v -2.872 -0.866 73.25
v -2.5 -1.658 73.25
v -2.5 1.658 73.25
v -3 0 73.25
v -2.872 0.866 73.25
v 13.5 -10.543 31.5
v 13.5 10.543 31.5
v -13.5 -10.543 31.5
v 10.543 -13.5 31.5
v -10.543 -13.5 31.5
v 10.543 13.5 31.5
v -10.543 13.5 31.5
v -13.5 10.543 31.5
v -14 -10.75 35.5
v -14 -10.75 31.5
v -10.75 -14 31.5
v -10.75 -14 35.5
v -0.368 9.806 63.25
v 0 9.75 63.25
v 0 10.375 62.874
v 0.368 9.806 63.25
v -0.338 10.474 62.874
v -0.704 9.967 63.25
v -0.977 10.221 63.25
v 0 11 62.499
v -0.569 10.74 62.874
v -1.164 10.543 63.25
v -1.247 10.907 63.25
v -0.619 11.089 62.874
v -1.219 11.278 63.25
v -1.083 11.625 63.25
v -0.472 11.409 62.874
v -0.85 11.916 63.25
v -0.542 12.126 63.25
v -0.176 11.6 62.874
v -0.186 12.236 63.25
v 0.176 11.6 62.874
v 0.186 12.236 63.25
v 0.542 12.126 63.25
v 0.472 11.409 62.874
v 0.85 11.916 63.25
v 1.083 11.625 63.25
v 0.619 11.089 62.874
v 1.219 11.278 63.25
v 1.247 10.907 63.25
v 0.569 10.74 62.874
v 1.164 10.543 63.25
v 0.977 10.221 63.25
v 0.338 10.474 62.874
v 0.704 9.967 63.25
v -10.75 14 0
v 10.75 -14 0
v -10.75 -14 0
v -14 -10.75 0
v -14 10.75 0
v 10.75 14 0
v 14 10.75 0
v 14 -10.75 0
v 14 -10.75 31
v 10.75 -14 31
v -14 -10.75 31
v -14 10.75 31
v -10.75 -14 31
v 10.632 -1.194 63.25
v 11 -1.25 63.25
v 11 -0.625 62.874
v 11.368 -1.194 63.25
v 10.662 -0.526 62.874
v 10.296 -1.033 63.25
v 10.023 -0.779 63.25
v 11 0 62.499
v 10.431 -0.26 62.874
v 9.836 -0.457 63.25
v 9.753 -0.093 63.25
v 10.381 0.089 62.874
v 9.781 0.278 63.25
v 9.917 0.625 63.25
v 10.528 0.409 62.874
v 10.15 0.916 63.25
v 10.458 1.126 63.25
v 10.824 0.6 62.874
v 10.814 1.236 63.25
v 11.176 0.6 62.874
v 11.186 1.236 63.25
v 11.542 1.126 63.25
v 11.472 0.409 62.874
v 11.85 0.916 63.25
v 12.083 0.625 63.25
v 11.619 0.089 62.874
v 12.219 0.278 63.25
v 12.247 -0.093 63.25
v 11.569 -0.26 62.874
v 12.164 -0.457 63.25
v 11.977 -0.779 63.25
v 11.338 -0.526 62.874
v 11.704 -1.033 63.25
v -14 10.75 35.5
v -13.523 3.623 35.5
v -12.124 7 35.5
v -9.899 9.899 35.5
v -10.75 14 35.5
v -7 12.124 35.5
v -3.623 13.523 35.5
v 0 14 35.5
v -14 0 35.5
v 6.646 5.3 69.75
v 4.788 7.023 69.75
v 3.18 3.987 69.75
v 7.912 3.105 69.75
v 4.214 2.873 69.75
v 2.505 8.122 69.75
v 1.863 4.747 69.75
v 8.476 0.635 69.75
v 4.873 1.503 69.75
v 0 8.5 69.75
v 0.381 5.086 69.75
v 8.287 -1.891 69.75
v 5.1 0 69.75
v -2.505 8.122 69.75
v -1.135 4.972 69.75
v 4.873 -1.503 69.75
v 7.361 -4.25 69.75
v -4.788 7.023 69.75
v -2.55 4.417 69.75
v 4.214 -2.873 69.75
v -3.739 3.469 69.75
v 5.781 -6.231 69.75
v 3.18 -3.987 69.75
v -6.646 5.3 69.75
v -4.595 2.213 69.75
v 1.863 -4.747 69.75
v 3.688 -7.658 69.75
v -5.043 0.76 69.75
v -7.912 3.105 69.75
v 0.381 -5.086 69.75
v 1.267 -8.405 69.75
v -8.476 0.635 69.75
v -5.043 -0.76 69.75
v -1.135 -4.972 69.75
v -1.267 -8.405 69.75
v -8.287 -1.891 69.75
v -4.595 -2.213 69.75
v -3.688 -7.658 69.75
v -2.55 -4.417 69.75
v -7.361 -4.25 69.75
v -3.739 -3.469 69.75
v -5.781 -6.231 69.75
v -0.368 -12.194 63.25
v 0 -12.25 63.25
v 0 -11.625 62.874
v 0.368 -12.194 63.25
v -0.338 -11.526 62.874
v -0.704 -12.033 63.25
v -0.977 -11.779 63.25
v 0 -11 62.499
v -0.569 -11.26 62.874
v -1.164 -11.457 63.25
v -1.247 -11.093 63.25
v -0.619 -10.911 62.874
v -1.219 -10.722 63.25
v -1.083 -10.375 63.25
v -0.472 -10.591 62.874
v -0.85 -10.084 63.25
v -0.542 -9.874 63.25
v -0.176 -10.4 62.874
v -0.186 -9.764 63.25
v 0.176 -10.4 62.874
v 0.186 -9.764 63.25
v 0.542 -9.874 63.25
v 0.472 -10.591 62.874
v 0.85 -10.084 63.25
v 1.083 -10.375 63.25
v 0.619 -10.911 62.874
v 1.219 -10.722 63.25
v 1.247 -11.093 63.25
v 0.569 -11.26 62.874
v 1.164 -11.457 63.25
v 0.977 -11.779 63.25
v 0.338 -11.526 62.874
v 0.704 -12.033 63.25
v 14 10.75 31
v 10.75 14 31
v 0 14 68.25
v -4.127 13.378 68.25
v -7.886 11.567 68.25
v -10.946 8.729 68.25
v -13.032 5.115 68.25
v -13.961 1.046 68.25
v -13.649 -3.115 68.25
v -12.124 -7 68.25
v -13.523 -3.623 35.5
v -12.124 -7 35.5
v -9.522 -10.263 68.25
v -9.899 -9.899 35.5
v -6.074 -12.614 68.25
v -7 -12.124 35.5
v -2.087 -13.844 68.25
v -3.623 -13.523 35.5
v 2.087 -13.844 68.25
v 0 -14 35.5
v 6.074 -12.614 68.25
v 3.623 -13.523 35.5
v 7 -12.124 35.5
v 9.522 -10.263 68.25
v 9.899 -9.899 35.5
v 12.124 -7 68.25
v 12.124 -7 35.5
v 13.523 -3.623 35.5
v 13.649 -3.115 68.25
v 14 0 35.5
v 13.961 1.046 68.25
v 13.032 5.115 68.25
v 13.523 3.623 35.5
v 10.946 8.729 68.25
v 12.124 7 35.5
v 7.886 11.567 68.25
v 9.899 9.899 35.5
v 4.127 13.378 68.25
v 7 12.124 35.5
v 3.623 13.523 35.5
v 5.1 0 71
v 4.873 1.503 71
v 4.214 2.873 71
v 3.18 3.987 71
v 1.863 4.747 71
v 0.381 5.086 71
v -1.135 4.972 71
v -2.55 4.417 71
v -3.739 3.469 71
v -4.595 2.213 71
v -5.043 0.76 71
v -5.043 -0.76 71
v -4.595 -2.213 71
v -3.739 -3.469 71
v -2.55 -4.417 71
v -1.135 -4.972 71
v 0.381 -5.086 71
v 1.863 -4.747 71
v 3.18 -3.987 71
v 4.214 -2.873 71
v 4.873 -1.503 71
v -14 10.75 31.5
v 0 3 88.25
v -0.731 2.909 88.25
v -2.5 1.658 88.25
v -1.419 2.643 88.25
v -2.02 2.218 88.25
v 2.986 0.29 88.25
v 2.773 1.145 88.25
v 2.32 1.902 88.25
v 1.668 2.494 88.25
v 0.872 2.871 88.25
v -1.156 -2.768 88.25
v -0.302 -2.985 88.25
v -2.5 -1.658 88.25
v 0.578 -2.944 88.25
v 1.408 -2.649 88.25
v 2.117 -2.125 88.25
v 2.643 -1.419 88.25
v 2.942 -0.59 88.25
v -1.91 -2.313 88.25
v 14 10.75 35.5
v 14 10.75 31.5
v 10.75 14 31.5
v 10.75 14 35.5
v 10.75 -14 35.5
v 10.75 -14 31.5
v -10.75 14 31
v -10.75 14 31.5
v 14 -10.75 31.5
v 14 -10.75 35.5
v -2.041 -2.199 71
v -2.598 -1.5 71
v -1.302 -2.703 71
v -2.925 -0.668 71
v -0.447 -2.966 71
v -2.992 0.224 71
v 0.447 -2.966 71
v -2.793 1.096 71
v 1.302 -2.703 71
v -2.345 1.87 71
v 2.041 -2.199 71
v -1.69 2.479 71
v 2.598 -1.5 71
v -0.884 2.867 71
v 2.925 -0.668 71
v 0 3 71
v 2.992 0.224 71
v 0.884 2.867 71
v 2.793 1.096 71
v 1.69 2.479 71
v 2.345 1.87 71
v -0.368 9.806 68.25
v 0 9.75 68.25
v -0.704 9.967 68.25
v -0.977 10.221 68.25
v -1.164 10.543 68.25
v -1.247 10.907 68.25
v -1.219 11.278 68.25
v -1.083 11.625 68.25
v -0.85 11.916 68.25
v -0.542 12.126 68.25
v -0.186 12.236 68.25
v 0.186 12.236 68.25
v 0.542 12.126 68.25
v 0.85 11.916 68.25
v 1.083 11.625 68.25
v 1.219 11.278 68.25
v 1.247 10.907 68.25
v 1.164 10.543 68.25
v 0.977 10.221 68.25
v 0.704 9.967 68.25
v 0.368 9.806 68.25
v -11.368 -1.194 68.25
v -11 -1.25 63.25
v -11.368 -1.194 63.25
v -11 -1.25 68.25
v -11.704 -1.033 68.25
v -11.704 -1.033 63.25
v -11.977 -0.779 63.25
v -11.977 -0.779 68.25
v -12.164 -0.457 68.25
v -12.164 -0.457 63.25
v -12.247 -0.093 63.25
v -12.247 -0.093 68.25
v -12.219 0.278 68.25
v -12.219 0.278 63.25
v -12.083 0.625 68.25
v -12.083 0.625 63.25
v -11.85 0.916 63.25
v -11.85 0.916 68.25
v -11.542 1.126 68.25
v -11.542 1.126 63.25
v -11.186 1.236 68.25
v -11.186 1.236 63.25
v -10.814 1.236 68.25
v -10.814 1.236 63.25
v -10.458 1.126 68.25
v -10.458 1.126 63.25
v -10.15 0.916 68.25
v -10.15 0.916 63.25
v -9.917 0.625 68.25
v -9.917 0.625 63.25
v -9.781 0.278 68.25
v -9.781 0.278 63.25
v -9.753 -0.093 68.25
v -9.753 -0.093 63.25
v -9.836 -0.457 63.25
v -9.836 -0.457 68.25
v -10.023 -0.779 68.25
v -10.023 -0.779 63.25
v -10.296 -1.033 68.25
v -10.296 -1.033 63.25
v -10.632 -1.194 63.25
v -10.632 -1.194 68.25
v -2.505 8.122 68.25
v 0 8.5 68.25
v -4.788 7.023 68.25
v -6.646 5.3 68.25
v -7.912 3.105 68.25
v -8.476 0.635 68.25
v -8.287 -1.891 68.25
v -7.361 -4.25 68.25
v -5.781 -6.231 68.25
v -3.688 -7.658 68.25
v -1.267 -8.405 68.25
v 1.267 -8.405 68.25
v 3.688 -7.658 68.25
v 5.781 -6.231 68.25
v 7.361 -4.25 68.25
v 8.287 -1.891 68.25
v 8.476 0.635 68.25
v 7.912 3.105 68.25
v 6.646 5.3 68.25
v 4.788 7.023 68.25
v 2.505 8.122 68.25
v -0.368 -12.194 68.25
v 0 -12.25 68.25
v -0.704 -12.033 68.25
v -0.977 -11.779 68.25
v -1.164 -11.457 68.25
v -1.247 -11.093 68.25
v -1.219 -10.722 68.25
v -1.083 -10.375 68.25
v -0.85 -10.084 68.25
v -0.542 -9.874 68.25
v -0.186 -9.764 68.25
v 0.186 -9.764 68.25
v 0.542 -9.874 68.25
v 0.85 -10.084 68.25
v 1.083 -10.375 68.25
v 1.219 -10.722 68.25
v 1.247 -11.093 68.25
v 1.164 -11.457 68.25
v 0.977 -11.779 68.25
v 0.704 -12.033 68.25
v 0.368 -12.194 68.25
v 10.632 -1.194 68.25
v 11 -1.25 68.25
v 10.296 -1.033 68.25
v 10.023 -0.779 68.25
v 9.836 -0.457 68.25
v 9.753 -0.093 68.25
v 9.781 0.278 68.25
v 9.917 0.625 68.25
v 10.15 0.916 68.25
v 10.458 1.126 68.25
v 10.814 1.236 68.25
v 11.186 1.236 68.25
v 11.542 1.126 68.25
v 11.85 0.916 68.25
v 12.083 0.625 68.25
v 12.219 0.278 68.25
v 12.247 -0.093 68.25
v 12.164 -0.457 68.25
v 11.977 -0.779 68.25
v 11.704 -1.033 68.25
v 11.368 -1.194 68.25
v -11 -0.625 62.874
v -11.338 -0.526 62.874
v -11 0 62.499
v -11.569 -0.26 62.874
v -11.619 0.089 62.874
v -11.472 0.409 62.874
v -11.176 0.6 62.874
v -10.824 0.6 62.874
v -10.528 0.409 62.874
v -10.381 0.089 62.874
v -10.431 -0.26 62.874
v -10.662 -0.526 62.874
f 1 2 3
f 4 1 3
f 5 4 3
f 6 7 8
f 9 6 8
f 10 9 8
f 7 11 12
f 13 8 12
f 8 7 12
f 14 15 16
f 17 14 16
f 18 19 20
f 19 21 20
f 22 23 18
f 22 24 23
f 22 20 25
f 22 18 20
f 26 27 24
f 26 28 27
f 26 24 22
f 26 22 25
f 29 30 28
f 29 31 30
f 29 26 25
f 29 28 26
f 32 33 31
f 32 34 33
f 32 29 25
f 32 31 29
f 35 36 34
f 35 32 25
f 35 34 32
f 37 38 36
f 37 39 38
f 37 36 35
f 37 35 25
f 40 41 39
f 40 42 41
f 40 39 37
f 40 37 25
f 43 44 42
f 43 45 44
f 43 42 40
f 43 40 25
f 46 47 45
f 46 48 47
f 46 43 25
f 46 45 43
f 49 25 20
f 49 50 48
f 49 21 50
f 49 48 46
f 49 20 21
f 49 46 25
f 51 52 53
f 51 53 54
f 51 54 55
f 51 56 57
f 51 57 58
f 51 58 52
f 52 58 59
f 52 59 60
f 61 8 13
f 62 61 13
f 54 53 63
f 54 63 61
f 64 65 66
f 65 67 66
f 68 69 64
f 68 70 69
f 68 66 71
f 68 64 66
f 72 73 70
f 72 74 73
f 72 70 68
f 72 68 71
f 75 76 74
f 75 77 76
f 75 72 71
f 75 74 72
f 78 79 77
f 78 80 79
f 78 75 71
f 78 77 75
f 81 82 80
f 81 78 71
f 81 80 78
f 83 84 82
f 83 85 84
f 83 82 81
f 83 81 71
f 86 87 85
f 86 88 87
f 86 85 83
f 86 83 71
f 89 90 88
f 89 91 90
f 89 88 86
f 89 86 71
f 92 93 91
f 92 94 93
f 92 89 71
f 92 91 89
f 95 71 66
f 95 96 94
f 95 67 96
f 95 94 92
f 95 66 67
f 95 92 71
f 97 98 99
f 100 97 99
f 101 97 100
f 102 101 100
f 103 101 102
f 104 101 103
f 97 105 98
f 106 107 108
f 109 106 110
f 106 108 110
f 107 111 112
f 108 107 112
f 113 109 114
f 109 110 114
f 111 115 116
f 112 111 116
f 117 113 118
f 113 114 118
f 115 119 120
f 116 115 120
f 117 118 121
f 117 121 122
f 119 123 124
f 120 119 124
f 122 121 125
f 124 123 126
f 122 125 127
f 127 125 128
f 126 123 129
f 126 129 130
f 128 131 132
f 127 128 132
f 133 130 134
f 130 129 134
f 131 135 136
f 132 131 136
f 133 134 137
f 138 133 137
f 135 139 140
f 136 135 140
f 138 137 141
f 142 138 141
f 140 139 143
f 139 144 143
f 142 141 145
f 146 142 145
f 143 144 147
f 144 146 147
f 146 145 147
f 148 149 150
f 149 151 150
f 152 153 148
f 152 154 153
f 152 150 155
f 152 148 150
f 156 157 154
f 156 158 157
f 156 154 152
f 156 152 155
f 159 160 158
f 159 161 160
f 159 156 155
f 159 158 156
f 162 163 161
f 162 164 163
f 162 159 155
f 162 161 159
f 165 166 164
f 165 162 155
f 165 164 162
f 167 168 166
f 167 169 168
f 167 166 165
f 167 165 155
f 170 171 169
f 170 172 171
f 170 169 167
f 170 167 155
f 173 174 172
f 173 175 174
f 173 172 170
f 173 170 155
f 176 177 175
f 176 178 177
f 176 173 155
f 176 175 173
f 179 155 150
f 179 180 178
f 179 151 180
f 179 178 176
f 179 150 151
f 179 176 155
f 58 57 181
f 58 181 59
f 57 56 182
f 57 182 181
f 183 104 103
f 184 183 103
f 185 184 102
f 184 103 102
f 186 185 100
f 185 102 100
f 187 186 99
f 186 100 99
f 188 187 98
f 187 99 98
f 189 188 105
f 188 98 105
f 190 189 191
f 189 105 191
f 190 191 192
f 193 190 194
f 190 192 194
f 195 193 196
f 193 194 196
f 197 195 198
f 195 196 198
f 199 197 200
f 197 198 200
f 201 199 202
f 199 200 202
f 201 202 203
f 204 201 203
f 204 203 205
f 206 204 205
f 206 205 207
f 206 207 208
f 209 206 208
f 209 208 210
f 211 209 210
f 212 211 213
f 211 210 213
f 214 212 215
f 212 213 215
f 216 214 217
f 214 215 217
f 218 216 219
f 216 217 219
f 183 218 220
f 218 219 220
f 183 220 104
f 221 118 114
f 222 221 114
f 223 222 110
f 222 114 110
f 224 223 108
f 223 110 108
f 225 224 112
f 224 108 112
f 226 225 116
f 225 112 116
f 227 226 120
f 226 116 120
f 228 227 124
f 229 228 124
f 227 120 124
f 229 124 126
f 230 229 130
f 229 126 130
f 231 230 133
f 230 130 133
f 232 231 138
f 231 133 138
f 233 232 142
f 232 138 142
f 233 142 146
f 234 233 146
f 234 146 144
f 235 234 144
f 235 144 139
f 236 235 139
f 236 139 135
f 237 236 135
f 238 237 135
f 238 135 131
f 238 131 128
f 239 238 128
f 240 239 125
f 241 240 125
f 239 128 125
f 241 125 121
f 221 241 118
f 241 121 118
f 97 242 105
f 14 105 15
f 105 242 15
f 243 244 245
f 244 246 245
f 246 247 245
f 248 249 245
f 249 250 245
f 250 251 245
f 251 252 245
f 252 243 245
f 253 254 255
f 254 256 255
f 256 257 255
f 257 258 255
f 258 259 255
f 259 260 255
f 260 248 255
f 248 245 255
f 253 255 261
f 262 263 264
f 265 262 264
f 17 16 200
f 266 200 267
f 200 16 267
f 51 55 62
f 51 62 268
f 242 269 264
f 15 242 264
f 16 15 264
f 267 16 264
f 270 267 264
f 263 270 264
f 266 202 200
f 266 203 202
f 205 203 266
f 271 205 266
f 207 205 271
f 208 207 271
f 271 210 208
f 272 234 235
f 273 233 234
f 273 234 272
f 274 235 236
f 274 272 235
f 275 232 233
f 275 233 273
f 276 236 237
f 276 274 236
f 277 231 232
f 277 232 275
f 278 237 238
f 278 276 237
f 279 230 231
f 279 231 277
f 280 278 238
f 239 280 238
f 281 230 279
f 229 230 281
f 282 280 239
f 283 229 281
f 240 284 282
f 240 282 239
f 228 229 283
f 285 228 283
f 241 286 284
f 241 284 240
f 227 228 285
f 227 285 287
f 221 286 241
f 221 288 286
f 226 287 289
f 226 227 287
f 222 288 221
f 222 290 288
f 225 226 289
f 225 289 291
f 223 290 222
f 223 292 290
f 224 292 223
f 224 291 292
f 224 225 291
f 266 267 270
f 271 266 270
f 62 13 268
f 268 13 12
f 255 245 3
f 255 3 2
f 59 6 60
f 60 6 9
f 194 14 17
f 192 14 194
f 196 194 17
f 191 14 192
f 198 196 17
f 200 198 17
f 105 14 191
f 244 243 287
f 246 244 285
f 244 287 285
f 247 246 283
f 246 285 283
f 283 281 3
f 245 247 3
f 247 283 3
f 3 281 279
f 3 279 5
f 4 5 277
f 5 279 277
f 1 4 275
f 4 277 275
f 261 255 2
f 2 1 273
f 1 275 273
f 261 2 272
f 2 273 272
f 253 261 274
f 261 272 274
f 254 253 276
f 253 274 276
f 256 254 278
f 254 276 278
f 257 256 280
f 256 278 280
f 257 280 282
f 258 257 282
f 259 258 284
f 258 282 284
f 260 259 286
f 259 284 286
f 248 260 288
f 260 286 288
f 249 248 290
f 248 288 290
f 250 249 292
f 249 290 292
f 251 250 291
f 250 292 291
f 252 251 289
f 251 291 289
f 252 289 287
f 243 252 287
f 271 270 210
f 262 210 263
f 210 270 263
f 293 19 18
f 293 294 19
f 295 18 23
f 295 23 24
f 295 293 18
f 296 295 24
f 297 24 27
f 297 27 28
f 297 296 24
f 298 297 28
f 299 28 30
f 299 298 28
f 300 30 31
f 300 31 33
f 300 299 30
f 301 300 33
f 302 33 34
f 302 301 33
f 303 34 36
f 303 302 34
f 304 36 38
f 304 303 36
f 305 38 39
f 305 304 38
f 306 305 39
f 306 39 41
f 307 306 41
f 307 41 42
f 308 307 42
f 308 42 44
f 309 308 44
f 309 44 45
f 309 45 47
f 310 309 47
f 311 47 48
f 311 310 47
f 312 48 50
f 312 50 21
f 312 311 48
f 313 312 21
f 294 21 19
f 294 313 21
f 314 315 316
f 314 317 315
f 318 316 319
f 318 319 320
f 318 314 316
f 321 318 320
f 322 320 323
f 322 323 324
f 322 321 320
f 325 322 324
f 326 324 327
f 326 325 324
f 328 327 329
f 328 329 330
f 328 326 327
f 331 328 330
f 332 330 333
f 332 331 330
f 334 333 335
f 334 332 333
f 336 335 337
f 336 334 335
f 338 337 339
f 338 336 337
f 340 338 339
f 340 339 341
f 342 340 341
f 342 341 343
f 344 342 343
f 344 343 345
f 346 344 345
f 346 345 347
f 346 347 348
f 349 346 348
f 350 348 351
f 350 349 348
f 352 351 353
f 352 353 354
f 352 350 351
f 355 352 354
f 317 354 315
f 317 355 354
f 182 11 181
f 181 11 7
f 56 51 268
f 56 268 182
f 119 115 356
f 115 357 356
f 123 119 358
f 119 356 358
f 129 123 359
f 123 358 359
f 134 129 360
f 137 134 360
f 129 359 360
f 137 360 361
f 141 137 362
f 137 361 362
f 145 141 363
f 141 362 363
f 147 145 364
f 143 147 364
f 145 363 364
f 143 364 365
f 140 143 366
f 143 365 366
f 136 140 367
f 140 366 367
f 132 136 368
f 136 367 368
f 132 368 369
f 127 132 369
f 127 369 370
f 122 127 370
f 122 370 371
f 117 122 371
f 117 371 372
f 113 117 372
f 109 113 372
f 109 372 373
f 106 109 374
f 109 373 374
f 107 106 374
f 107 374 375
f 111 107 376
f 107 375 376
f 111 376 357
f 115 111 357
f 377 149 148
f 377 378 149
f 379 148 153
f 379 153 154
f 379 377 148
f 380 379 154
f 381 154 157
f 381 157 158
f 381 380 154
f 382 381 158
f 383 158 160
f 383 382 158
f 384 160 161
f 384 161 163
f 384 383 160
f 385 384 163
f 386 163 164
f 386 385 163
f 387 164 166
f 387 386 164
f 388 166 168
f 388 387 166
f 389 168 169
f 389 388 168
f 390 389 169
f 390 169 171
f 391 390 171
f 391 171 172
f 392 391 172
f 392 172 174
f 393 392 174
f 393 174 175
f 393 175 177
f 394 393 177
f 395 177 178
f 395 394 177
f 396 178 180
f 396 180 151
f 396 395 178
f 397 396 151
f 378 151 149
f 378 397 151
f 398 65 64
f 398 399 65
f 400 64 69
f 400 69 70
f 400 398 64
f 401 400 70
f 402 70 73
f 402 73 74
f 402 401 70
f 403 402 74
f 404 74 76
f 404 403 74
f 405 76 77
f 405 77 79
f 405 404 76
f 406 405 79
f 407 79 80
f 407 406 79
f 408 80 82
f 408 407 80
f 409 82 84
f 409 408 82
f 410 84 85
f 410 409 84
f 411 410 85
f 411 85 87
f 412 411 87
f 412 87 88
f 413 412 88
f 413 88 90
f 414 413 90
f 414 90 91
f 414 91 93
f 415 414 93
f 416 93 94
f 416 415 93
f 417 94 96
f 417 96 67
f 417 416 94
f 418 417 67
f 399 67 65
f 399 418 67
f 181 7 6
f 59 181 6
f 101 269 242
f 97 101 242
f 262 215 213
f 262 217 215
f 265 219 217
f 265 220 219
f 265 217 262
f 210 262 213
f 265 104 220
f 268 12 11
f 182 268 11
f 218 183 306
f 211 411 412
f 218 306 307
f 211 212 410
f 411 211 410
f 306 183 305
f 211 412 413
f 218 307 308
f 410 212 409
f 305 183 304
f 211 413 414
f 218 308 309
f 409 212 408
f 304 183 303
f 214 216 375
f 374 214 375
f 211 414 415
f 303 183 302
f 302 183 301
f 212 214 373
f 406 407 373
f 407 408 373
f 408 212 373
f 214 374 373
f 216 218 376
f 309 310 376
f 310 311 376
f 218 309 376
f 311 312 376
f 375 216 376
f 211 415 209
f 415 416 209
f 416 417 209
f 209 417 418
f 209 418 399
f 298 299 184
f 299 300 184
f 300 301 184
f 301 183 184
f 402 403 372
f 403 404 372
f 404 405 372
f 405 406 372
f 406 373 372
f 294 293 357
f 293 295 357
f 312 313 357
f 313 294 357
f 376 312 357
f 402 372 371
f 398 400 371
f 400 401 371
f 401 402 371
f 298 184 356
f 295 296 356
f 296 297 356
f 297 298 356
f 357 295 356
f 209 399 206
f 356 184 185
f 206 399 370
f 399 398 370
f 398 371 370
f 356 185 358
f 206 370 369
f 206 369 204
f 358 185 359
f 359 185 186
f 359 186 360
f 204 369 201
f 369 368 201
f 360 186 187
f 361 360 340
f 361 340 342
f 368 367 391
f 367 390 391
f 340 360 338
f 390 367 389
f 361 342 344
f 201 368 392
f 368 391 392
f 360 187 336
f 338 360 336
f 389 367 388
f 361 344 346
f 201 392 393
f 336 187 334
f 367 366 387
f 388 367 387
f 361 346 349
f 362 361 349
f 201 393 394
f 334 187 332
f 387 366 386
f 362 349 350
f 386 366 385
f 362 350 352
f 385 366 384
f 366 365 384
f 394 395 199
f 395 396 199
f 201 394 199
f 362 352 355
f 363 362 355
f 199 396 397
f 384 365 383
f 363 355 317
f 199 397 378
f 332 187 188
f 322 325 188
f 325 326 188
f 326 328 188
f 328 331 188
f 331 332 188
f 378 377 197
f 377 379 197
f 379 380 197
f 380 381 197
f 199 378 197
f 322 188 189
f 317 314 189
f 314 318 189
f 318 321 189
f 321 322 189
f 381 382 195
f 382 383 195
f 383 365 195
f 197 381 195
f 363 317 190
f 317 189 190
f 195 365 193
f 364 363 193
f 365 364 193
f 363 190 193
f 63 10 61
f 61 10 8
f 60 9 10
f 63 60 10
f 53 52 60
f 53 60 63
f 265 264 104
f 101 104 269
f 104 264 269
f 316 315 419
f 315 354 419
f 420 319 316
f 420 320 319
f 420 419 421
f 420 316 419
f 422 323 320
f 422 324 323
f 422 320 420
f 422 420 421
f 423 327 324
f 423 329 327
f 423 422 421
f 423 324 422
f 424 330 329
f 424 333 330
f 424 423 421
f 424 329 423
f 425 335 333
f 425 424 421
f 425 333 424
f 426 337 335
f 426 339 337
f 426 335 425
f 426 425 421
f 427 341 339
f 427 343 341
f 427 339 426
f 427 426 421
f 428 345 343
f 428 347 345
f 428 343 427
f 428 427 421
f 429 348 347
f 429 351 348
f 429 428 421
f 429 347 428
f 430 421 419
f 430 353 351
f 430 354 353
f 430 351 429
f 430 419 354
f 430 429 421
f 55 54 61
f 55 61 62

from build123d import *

# Parameters (mm, degrees)
BOSS_EXTRUDE1_DEPTH            = 31.5
BOSS_EXTRUDE2_DEPTH            = 4
CHAMFER1_SIZE                  = 0.5
M3X0_5_TAPPED_HOLE1_AT_2_COUNT = 2
M3X0_5_TAPPED_HOLE1_AT_2_PITCH = 15.556349186
M3X0_5_TAPPED_HOLE1_AT_3_COUNT = 2
M3X0_5_TAPPED_HOLE1_AT_3_PITCH = 22
M3X0_5_TAPPED_HOLE1_AT_4_COUNT = 2
M3X0_5_TAPPED_HOLE1_AT_4_PITCH = 15.556349186
SKETCH8_R                      = 5.1
SKETCH8_R_2                    = 3
BOSS_EXTRUDE3_DEPTH            = 1.25
CUT_EXTRUDE1_DEPTH             = 15


with BuildPart() as part:
    # Sketch1 → Boss-Extrude1 (new body)
    with BuildSketch(Plane.XY):
        Polygon((10.75, -14), (-10.75, -14), (-14, -10.75), (-14, 10.75), (-10.75, 14), (10.75, 14), (14, 10.75), (14, -10.75), align=None)
    extrude(amount=BOSS_EXTRUDE1_DEPTH)

    # Chamfer1
    chamfer1_edges = [part.edges().sort_by_distance(p)[0] for p in [
        (-12.375, 12.375, 31.5),
        (-14, 0, 31.5),
        (-12.375, -12.375, 31.5),
        (0, -14, 31.5),
        (12.375, -12.375, 31.5),
        (14, 0, 31.5),
        (12.375, 12.375, 31.5),
        (0, 14, 31.5),
    ]]
    chamfer(chamfer1_edges, length=CHAMFER1_SIZE)


with BuildPart() as body_2:
    # Sketch3 → Boss-Extrude2 (new body)
    with BuildSketch(Plane.XY.offset(31.5)):
        Polygon((14, 10.75), (10.75, 14), (-10.75, 14), (-14, 10.75), (-14, -10.75), (-10.75, -14), (10.75, -14), (14, -10.75), align=None)
    extrude(amount=BOSS_EXTRUDE2_DEPTH)

    # Sketch4 → Revolve1 (revolve)
    with BuildSketch(Plane(origin=(0, 0, 0), x_dir=(0, 0, -1), z_dir=(1, 0, 0))):
        Polygon((-88.25, 0), (-88.25, 3), (-69.75, 3), (-69.75, 8.5), (-68.25, 8.5), (-68.25, 14), (-35.5, 14), (-35.5, 0), align=None)
    revolve(axis=Axis((0, 0, 35.5), (0, 0, 1)))

    # Sketch7 → M3x0.5 Tapped Hole1 (revolve, cut)
    with BuildSketch(Plane(origin=(0, 11, 68.25), x_dir=(0, -1, 0), z_dir=(1, 0, 0))):
        Polygon((0, 0), (0, 5.751075774), (1.25, 5), (1.25, 0), align=None)
    m3x0_5_tapped_hole1 = revolve(axis=Axis((0, 11, 74.6), (0, 0, -1)), mode=Mode.SUBTRACT)

    # M3x0.5 Tapped Hole1 at 2: M3x0.5 Tapped Hole1 ×2
    with Locations(*[Vector(0.707106781, -0.707106781, 0) * (i * M3X0_5_TAPPED_HOLE1_AT_2_PITCH) for i in range(1, M3X0_5_TAPPED_HOLE1_AT_2_COUNT)]):
        add(m3x0_5_tapped_hole1, mode=Mode.SUBTRACT)

    # M3x0.5 Tapped Hole1 at 3: M3x0.5 Tapped Hole1 ×2
    with Locations(*[(0, -i * M3X0_5_TAPPED_HOLE1_AT_3_PITCH, 0) for i in range(1, M3X0_5_TAPPED_HOLE1_AT_3_COUNT)]):
        add(m3x0_5_tapped_hole1, mode=Mode.SUBTRACT)

    # M3x0.5 Tapped Hole1 at 4: M3x0.5 Tapped Hole1 ×2
    with Locations(*[Vector(-0.707106781, -0.707106781, 0) * (i * M3X0_5_TAPPED_HOLE1_AT_4_PITCH) for i in range(1, M3X0_5_TAPPED_HOLE1_AT_4_COUNT)]):
        add(m3x0_5_tapped_hole1, mode=Mode.SUBTRACT)

    # Sketch8 → Boss-Extrude3 (add)
    with BuildSketch(Plane.XY.offset(69.75)):
        Circle(SKETCH8_R)
        Circle(SKETCH8_R_2, mode=Mode.SUBTRACT)
    extrude(amount=BOSS_EXTRUDE3_DEPTH)

    # Sketch9 → Cut-Extrude1 (cut)
    with BuildSketch(Plane.XY.offset(88.25)):
        with BuildLine():
            Line((-2.5, 1.658312395), (-2.5, -1.658312395))
            ThreePointArc((-2.5, -1.658312395), (-3, 0), (-2.5, 1.658312395))
        make_face()
    extrude(amount=-CUT_EXTRUDE1_DEPTH, mode=Mode.SUBTRACT)


solid = Compound([part.part, body_2.part])
